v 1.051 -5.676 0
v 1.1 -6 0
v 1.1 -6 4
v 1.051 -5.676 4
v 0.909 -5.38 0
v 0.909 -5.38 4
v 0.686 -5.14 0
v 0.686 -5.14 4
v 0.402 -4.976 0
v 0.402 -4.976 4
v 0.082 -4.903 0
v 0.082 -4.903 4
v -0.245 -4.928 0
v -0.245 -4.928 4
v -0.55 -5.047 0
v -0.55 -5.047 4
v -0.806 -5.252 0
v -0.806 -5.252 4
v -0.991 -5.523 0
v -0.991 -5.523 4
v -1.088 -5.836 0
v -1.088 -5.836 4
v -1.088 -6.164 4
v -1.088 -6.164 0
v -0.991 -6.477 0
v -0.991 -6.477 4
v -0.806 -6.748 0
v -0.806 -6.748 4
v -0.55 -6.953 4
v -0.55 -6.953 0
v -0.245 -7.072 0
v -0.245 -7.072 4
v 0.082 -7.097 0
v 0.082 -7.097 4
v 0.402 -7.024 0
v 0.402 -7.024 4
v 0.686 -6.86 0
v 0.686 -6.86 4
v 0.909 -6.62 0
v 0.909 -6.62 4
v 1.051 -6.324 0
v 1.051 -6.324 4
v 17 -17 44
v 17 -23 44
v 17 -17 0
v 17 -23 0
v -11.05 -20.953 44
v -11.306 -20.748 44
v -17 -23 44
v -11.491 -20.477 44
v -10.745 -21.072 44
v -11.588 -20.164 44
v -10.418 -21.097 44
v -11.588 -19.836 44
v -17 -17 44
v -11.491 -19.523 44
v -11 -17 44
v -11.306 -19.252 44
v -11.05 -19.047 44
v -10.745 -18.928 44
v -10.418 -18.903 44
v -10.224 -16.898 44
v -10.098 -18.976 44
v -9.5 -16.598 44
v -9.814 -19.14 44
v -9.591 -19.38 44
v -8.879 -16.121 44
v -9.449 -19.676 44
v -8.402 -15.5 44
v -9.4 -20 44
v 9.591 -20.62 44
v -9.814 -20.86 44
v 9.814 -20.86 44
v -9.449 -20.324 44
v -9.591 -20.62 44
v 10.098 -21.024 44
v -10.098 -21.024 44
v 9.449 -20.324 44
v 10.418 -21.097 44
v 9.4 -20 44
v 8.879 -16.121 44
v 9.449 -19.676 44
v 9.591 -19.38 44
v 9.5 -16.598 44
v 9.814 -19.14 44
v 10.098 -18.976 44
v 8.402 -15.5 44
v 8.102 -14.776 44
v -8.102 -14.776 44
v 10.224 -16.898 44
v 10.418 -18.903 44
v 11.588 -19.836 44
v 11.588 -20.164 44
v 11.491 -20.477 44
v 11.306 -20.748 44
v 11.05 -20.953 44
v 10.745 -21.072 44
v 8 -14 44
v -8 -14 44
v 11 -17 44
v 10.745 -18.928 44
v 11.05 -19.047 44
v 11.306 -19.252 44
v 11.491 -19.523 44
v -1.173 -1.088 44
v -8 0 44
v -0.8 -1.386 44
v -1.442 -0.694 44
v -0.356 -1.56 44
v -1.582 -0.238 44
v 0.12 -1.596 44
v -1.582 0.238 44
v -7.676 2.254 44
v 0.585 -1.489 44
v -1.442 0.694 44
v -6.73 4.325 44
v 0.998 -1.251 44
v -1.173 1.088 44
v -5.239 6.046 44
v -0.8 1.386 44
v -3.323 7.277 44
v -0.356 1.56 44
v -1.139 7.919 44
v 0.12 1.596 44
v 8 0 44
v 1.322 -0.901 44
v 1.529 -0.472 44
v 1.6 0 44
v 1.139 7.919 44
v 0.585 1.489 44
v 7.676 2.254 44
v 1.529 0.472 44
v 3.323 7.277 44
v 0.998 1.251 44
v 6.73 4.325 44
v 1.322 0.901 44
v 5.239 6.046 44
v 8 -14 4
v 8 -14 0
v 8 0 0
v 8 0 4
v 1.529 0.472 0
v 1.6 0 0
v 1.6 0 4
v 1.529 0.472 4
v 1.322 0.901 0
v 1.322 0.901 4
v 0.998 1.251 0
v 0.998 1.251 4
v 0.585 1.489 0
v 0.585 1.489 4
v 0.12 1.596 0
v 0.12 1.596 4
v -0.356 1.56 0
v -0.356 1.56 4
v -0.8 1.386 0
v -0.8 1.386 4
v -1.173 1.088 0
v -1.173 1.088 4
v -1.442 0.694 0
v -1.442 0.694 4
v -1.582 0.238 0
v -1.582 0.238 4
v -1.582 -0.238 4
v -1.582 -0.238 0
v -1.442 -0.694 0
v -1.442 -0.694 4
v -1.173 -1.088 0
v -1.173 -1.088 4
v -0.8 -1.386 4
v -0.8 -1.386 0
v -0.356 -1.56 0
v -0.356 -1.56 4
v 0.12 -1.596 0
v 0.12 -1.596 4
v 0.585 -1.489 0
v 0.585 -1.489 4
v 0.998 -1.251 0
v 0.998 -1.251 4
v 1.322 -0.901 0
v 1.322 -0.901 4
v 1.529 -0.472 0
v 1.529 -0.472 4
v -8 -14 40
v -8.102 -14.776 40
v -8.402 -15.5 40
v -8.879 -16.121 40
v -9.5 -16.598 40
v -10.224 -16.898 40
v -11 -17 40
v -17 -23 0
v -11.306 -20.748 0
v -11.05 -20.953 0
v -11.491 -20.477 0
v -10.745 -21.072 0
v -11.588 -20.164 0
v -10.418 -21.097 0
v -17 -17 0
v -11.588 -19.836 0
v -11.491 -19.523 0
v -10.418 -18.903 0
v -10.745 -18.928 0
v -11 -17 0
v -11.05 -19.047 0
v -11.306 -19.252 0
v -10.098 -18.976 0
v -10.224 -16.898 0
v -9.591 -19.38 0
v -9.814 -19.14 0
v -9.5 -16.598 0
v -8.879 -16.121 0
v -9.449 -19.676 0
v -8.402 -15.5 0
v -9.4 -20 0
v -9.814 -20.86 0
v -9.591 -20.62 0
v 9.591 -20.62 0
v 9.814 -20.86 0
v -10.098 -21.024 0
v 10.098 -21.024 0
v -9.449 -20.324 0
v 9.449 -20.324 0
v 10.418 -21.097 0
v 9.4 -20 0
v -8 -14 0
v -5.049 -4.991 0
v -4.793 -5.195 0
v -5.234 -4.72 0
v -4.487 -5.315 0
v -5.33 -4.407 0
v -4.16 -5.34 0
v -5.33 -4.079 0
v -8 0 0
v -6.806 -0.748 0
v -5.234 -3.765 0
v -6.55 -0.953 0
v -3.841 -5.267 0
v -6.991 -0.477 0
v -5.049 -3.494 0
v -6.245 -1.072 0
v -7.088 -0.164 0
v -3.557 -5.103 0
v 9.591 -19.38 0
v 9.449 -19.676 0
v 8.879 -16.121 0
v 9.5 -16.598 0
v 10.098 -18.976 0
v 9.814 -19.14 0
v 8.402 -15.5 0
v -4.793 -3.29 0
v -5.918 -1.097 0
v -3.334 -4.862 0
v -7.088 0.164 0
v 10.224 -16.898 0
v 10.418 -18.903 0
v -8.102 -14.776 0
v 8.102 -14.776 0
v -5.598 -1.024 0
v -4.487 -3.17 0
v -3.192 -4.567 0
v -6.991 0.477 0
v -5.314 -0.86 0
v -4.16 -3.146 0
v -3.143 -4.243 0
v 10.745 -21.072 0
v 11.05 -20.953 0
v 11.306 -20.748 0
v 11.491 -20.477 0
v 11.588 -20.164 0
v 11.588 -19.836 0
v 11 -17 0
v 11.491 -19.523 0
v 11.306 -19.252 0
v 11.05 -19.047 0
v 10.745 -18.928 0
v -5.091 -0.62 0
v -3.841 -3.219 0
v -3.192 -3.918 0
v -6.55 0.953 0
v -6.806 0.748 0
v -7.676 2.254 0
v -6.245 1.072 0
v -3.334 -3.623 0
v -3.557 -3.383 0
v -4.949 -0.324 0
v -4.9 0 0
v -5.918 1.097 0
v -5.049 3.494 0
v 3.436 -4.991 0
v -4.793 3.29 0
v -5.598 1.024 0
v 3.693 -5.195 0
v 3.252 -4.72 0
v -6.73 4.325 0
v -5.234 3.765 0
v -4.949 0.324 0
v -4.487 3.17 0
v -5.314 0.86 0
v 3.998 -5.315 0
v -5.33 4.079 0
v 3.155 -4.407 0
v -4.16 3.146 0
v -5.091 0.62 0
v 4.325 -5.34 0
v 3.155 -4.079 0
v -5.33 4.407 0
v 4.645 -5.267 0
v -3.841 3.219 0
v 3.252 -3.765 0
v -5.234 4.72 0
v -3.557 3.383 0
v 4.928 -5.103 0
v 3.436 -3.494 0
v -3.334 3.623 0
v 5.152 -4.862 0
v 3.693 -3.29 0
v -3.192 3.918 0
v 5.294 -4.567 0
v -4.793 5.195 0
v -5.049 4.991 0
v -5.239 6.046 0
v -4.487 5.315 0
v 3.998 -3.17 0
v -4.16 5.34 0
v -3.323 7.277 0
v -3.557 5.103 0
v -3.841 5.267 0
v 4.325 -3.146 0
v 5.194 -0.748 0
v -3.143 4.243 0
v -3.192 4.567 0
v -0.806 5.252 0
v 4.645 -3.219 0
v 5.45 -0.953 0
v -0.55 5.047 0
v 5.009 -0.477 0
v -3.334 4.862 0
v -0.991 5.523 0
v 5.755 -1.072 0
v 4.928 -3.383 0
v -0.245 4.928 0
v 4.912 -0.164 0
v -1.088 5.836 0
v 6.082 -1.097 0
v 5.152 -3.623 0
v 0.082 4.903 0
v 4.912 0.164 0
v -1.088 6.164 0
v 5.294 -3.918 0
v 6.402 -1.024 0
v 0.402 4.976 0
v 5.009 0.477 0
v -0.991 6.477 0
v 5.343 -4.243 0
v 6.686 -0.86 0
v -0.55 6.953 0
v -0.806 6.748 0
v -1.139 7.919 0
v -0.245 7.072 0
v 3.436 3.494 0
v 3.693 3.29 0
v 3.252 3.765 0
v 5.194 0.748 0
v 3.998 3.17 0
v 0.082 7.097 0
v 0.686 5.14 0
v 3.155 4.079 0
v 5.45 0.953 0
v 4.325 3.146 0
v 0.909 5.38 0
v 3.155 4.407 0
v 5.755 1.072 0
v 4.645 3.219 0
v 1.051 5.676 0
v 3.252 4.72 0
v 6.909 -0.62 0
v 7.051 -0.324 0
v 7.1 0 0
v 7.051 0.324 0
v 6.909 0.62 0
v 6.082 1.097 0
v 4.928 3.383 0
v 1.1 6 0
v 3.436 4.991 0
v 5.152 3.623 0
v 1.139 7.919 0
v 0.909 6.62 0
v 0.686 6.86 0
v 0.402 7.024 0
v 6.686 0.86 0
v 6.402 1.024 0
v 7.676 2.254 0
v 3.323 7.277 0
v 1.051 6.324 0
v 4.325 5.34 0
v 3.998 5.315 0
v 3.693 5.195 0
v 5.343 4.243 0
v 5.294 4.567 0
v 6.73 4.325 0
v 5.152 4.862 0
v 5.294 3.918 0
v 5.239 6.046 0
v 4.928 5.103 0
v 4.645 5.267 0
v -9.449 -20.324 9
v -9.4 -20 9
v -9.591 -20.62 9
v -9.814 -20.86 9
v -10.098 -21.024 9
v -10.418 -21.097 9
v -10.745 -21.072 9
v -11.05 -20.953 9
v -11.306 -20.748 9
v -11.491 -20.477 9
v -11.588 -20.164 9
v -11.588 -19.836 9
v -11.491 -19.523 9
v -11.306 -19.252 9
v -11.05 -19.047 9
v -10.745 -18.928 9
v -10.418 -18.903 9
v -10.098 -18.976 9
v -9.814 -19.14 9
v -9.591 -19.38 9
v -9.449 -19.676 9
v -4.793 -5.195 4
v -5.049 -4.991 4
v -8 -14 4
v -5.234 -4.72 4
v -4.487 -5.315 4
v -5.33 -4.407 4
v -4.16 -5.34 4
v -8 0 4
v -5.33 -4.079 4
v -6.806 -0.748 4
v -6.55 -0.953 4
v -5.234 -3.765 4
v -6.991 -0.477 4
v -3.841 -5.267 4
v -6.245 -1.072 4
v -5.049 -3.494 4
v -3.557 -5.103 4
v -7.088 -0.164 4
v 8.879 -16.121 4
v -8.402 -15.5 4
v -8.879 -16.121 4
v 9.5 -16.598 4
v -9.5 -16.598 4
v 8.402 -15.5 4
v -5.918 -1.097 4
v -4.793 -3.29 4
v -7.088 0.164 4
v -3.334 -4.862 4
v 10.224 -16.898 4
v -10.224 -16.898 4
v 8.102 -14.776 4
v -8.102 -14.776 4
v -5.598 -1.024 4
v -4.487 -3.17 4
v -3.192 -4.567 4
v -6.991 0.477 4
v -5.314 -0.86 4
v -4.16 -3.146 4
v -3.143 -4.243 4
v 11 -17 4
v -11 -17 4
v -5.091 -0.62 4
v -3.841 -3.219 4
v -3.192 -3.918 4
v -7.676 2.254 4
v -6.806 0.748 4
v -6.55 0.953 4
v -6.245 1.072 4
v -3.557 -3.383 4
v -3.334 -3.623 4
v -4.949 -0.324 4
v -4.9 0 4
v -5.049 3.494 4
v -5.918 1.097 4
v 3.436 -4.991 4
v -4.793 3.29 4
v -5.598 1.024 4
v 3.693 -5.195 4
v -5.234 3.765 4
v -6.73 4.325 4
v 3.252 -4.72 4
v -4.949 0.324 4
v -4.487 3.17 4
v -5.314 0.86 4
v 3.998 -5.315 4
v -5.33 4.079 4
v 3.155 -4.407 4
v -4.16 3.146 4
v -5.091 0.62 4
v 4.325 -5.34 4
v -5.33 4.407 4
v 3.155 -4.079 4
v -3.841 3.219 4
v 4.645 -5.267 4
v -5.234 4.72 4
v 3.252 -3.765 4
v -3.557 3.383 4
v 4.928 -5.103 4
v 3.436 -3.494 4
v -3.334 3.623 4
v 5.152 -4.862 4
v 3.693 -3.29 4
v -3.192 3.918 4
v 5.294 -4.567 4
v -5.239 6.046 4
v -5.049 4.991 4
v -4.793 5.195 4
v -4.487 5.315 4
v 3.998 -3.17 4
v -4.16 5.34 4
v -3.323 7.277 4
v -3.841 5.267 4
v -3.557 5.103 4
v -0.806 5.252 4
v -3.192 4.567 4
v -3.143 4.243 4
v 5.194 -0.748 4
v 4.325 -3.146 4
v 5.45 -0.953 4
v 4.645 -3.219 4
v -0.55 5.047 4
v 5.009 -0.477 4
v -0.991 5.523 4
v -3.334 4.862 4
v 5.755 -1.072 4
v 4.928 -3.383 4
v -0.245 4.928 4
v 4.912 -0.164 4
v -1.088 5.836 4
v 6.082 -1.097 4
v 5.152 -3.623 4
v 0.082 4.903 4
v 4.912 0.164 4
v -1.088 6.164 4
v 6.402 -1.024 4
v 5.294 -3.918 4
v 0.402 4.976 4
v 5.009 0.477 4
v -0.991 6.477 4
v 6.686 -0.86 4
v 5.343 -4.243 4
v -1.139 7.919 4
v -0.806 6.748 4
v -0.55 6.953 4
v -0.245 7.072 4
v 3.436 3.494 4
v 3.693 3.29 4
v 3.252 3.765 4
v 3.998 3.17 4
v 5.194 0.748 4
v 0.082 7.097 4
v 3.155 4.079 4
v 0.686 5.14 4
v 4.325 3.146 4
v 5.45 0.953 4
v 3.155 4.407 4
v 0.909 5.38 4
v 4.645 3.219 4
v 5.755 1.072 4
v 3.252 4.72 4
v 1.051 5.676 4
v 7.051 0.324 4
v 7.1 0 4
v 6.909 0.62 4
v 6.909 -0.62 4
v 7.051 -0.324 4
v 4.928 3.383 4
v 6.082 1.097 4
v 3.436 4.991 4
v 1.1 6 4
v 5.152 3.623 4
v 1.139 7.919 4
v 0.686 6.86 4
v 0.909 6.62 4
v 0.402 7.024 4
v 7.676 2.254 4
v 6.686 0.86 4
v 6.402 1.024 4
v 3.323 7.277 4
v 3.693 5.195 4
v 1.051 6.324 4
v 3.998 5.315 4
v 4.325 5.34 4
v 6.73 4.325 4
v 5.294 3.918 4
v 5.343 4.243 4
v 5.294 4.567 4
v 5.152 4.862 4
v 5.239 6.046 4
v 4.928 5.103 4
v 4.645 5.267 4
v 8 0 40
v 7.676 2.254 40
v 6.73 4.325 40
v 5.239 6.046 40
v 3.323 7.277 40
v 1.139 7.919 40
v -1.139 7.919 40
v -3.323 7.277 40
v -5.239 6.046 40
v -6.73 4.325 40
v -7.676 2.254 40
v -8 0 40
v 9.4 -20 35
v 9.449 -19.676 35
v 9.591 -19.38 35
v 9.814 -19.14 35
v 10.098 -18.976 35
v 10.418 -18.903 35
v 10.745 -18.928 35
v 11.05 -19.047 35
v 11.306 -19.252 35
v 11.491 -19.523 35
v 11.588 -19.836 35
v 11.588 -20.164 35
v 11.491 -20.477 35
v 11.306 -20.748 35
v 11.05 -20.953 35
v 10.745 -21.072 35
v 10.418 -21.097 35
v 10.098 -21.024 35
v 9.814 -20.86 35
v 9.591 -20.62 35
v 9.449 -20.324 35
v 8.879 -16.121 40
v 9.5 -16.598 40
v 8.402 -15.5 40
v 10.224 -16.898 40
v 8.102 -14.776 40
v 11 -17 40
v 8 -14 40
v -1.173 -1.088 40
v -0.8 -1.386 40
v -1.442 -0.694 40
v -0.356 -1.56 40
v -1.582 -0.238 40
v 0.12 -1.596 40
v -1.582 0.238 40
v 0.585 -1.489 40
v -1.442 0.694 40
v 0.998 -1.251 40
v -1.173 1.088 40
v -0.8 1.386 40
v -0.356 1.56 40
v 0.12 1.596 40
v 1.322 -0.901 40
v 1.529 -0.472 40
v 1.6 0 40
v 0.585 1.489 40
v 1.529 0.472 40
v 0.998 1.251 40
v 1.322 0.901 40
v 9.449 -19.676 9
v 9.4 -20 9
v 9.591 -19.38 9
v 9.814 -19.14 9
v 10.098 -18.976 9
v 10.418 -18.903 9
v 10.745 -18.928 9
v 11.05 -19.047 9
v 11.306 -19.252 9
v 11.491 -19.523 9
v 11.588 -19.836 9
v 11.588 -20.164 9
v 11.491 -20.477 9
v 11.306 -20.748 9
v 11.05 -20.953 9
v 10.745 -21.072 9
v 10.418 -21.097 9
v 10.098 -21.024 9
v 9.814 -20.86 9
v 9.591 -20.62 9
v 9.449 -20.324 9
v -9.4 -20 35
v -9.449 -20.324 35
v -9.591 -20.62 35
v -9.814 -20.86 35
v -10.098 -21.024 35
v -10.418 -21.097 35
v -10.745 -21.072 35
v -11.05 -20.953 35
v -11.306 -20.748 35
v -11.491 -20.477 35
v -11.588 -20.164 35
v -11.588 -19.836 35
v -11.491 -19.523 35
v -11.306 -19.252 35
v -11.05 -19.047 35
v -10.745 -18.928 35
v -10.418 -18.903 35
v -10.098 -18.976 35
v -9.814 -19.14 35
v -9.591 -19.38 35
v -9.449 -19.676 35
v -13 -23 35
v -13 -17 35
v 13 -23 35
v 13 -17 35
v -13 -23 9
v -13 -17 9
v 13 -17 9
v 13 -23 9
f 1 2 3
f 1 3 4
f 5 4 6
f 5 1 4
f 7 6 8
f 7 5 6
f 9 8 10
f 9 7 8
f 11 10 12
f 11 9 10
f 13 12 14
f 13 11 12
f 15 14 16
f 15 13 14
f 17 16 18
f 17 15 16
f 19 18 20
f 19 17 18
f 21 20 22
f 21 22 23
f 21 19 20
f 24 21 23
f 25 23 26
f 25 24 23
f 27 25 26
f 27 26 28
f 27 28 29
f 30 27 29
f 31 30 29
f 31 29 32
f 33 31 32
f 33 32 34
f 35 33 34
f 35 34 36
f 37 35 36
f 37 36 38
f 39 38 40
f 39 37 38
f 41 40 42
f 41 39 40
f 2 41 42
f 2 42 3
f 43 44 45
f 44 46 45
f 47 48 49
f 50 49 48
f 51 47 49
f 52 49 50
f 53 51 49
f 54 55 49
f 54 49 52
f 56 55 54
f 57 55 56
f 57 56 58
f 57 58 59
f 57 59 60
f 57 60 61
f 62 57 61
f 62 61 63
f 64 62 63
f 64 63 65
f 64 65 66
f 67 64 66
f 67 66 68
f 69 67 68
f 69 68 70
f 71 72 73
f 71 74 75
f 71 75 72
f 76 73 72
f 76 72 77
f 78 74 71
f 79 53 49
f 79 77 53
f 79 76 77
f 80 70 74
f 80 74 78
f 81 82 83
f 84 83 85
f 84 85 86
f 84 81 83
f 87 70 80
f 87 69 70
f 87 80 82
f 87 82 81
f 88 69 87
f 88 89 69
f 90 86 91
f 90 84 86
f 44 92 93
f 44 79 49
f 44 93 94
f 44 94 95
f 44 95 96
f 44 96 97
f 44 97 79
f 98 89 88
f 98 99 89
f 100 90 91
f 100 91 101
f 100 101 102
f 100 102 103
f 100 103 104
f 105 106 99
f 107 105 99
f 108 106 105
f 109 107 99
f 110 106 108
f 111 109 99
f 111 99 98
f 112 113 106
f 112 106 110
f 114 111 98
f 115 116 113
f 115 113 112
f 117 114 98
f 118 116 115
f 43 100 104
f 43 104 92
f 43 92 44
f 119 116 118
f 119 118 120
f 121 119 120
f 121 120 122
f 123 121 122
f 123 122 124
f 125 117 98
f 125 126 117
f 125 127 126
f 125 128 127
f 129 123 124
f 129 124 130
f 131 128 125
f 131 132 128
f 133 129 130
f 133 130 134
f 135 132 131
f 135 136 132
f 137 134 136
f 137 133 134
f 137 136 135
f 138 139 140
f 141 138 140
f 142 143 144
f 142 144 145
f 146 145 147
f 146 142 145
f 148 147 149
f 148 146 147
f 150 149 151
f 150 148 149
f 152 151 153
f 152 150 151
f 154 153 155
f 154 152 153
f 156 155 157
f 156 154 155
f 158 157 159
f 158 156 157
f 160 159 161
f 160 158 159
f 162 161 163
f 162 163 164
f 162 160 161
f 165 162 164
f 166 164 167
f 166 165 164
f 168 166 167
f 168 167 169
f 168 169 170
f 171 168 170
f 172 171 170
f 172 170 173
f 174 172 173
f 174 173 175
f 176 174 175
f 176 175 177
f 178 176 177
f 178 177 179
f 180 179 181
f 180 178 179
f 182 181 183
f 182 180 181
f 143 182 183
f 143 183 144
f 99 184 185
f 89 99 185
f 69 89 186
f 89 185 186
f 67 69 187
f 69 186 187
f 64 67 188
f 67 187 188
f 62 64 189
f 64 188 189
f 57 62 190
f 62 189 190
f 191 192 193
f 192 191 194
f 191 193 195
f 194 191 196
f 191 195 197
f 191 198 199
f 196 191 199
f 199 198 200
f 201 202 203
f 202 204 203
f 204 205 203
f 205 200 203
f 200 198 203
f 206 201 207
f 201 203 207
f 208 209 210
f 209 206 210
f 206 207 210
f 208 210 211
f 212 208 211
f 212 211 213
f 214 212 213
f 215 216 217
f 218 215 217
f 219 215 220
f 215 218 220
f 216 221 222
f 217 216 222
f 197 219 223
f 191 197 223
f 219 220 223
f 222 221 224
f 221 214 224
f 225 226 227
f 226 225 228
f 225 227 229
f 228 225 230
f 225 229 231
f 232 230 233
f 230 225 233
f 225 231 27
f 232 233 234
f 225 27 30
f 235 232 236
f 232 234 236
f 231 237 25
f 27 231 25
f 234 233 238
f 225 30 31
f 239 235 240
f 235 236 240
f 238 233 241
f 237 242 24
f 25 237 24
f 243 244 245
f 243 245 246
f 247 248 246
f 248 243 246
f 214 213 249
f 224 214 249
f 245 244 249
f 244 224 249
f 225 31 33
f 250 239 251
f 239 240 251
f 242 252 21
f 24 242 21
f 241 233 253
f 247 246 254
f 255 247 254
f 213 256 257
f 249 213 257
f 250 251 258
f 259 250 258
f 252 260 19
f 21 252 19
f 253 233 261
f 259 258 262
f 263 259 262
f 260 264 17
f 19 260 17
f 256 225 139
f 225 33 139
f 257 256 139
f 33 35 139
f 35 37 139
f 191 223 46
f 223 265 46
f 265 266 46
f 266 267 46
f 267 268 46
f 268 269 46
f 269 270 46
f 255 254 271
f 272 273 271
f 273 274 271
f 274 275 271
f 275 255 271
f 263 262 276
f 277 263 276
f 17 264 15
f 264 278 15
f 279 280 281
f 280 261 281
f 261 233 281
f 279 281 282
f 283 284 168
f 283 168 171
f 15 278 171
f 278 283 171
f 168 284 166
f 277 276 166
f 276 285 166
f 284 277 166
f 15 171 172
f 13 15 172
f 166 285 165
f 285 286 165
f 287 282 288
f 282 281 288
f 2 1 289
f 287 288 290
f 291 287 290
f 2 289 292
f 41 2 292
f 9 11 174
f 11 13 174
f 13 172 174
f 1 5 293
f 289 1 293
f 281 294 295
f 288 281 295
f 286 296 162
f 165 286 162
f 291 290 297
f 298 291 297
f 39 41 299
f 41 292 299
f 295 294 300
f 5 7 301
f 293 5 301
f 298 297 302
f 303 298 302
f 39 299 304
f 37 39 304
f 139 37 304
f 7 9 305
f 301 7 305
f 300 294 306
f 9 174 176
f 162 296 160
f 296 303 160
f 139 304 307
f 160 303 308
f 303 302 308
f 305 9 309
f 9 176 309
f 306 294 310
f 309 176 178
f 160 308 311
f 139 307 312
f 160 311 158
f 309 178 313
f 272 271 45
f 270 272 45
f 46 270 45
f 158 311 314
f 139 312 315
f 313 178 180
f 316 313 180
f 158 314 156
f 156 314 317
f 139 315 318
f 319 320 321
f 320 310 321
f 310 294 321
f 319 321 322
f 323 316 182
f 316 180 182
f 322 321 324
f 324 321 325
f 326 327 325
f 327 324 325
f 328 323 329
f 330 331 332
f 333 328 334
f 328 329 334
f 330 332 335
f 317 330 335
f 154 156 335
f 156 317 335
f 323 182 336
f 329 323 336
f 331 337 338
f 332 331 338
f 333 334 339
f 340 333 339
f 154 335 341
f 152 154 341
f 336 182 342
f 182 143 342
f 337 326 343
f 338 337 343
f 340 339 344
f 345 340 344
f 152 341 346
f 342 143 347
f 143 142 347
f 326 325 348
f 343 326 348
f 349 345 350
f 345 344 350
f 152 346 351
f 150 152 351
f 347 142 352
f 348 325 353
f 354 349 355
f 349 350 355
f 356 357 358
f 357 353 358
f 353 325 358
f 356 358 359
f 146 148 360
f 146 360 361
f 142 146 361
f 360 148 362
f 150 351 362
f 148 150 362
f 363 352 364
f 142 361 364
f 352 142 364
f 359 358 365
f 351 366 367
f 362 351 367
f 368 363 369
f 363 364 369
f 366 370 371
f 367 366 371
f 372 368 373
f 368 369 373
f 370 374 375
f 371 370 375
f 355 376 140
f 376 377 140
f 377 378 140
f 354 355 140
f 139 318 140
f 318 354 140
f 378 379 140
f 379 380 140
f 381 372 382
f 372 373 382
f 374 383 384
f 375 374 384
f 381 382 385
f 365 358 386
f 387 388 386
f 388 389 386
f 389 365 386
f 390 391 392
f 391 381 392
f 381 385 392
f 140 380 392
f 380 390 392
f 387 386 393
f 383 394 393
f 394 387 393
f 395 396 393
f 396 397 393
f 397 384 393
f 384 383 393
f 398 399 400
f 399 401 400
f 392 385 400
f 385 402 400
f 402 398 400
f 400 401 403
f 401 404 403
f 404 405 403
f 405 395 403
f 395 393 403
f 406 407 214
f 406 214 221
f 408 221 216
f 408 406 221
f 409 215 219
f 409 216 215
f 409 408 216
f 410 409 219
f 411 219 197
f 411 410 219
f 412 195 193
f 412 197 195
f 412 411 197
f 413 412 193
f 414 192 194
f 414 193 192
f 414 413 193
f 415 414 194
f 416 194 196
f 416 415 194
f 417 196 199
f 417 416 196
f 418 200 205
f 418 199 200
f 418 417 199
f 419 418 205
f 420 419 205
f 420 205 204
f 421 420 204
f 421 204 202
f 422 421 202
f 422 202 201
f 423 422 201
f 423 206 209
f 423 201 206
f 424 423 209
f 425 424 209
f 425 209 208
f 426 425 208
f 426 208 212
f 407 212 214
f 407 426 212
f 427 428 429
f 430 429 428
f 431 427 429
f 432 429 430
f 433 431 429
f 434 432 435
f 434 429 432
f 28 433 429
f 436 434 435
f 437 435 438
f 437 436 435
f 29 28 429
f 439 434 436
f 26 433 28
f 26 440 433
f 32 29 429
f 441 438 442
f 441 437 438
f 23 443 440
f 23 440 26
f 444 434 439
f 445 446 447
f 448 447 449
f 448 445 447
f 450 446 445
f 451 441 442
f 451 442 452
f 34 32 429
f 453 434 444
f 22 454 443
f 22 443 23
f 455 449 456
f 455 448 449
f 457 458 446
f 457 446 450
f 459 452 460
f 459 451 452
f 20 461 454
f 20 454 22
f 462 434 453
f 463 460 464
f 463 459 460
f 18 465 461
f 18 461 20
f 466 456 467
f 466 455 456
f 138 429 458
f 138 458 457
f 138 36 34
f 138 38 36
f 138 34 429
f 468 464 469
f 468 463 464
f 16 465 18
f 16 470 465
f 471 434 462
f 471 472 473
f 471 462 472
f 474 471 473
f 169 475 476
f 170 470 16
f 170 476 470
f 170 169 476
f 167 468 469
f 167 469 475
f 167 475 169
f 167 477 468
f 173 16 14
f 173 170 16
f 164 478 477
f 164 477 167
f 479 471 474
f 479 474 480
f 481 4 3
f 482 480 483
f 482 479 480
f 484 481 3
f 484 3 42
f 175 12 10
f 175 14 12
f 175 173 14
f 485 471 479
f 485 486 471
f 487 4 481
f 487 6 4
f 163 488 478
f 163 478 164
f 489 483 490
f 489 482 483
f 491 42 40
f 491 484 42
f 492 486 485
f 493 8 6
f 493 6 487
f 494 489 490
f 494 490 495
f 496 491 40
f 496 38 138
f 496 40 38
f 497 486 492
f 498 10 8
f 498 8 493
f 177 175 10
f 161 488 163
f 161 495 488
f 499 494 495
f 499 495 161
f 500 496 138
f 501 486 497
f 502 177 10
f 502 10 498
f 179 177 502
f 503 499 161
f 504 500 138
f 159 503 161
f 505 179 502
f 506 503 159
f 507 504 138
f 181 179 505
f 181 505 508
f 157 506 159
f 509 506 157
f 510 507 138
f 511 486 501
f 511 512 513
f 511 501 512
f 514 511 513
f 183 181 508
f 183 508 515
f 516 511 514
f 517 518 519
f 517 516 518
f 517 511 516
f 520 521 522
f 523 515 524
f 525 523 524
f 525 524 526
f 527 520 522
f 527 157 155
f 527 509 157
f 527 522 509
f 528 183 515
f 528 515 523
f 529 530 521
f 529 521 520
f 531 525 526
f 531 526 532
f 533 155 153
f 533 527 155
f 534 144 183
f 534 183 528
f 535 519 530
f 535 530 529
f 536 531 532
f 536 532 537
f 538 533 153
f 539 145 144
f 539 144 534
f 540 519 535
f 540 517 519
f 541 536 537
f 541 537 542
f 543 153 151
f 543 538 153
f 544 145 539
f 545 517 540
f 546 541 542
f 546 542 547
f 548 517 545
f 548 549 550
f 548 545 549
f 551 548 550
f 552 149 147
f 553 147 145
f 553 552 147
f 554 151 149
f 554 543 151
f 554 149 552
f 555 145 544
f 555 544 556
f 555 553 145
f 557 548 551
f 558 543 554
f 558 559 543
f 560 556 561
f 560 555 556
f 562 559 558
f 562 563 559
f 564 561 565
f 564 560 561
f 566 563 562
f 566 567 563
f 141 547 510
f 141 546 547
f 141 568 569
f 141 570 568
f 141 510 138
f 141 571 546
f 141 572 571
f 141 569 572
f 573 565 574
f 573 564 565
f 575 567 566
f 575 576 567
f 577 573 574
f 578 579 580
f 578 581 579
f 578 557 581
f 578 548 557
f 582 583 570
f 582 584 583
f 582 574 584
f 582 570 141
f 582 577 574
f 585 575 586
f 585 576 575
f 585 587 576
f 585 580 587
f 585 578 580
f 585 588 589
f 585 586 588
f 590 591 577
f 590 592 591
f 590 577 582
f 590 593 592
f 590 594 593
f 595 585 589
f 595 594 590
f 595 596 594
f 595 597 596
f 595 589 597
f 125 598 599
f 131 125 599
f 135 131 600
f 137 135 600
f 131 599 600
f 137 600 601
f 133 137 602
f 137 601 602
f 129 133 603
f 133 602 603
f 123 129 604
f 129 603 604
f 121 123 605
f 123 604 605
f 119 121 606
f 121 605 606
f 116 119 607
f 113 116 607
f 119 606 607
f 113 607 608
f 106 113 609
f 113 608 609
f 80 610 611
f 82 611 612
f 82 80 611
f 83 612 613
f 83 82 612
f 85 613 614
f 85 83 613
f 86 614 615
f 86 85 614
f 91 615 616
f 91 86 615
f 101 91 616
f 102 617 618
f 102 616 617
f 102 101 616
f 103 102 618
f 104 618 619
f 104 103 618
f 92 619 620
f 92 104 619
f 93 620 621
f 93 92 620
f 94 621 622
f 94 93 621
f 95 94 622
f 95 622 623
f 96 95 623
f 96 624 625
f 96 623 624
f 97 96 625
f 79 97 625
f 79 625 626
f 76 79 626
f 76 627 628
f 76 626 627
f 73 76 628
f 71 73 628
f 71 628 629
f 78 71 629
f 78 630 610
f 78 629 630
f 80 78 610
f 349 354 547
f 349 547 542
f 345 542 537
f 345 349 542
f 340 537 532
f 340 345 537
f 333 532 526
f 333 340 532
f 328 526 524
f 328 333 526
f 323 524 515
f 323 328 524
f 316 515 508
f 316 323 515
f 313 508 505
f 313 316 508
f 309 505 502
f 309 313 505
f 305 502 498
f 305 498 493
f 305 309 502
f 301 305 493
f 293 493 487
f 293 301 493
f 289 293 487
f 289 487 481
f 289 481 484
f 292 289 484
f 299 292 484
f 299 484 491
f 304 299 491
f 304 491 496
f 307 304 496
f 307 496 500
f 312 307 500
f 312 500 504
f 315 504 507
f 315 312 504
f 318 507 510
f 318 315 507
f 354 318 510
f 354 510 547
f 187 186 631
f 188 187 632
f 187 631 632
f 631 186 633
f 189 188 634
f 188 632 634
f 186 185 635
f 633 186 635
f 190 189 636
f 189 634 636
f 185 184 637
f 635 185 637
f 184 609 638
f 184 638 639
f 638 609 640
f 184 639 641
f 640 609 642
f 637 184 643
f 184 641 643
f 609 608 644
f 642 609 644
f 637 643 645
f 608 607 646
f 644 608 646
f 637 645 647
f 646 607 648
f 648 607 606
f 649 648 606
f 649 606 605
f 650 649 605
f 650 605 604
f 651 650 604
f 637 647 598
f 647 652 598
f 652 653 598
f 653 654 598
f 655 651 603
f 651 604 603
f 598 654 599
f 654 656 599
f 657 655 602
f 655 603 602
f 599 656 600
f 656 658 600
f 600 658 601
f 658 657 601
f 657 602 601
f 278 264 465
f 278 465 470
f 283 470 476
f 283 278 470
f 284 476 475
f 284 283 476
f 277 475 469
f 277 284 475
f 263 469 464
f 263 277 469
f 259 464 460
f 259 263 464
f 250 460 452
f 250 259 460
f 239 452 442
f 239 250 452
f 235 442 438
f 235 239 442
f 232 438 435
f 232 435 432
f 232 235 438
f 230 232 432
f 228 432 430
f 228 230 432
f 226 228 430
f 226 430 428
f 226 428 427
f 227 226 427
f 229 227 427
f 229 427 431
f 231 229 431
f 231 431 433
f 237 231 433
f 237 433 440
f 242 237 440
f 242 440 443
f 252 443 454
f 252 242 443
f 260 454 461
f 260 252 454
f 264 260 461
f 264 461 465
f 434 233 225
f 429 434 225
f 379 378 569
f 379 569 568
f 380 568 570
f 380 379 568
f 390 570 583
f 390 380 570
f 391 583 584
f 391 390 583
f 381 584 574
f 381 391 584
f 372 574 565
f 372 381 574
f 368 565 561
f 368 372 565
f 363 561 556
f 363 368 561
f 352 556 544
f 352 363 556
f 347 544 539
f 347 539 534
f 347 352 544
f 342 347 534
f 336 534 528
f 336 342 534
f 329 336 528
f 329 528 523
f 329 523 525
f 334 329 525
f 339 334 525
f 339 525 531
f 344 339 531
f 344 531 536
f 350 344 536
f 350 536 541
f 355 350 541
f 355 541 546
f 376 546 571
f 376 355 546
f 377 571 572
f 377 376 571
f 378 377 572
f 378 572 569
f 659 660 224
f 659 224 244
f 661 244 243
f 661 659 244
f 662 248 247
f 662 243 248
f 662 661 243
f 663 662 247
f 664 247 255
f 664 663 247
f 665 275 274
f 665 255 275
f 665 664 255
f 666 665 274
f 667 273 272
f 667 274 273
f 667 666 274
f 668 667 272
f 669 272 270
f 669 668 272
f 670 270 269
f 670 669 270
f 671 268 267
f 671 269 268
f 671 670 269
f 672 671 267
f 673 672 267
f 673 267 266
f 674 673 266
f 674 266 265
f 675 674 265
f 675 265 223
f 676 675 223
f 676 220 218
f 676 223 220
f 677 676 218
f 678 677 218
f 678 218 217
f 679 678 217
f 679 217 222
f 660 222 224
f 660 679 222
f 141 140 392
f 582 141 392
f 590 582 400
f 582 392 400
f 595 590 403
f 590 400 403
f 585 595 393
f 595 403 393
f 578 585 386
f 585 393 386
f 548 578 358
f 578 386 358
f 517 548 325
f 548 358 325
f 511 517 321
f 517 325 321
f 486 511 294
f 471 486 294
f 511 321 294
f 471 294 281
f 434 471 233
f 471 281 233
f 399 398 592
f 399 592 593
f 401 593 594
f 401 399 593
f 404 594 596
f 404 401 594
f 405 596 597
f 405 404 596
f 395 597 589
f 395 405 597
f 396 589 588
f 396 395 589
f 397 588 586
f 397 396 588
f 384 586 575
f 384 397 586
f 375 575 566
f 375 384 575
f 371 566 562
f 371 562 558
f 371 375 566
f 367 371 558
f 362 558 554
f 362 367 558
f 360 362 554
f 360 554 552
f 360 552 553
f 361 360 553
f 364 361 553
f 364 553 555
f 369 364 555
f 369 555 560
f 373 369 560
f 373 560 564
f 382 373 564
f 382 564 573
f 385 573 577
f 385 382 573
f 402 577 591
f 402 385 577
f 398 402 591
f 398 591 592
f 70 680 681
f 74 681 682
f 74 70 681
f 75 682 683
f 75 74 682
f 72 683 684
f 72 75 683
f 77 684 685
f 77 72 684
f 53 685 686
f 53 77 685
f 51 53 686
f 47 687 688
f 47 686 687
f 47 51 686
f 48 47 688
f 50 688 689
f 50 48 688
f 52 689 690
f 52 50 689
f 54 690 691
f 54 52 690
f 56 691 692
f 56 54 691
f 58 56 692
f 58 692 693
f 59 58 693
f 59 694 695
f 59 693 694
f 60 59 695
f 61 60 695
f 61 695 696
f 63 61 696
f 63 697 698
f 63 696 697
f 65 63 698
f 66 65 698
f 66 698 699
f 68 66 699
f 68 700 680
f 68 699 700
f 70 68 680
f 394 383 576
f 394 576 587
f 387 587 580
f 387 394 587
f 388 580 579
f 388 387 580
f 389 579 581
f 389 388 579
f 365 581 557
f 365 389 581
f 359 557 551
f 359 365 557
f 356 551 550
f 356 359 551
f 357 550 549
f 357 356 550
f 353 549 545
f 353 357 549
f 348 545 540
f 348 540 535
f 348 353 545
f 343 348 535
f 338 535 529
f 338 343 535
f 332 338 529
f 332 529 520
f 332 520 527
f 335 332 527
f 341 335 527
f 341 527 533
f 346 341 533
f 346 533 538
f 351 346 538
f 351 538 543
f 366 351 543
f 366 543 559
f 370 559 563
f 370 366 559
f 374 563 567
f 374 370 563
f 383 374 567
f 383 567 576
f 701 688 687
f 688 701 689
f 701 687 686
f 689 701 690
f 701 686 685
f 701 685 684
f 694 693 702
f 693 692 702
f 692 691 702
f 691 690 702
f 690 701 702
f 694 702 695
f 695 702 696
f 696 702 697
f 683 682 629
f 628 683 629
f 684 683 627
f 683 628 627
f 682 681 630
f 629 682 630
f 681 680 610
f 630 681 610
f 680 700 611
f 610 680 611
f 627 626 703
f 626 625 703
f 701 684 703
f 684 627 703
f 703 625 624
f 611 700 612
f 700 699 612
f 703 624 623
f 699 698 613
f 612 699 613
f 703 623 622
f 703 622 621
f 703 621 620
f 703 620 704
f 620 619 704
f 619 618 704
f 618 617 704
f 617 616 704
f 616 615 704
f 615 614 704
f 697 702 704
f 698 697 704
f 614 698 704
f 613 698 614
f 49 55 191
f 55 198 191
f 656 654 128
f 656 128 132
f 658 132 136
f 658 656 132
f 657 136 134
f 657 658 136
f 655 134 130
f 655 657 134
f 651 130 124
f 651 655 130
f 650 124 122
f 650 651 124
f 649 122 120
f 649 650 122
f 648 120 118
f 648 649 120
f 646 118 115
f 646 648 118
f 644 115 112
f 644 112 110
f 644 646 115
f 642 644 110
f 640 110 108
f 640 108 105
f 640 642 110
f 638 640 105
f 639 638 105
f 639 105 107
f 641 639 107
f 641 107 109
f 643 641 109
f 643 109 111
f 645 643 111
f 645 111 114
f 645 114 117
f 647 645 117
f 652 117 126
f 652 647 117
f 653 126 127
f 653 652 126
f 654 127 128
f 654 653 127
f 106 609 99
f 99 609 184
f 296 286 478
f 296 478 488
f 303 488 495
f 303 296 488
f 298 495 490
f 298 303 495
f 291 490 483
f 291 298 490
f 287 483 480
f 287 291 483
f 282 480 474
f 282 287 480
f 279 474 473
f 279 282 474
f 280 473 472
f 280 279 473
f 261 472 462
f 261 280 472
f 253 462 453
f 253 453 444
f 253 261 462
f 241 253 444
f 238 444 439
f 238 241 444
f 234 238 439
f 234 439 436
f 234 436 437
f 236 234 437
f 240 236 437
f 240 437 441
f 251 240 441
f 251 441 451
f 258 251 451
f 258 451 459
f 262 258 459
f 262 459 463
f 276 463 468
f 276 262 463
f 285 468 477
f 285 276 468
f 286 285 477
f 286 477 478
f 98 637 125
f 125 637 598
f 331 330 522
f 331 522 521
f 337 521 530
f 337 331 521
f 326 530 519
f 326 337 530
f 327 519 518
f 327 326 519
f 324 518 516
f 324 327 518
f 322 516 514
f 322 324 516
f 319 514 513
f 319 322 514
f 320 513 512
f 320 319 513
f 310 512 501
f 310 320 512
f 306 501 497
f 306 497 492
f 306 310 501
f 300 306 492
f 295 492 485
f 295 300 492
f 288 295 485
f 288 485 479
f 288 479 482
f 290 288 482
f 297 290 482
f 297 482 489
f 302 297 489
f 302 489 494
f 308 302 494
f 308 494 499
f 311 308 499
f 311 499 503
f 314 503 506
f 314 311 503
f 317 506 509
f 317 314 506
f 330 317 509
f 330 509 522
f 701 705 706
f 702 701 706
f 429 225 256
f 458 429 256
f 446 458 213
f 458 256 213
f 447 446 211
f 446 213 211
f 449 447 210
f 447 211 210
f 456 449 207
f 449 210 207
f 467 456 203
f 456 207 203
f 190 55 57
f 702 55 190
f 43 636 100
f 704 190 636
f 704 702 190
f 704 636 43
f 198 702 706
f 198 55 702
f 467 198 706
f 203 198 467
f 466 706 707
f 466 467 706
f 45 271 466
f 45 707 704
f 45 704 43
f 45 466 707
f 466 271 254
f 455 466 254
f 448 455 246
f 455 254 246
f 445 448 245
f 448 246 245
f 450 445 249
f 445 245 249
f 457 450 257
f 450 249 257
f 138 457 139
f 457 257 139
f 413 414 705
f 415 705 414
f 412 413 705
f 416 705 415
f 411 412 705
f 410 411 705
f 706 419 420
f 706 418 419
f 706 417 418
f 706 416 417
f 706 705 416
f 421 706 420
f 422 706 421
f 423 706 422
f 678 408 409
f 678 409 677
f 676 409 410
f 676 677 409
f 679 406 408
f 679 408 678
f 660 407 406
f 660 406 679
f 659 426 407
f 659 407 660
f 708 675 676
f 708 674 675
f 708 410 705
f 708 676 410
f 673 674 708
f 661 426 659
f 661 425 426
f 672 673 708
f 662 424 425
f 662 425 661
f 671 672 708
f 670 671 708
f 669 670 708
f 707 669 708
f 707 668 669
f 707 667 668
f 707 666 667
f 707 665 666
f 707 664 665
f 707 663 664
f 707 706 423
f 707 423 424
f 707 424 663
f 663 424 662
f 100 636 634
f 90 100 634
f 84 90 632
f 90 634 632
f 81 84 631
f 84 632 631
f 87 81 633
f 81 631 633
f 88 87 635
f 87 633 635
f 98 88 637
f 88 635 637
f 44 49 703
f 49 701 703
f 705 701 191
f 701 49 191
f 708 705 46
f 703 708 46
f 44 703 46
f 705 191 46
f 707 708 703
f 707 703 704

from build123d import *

# Parameters (mm, degrees)
SKETCH_1_R          = 1.1
SKETCH_1_R_2        = 1.6
EXTRUDE_1_DEPTH     = 4
SKETCH_2_W          = 4
SKETCH_2_H          = 6
EXTRUDE_2_DEPTH     = 36
SKETCH_3_R          = 1.6
EXTRUDE_3_DEPTH     = 4
SKETCH_4_W          = 26
SKETCH_4_H          = 5
EXTRUDE_4_DEPTH     = 6
SKETCH_7_R          = 1.1
CUT_EXTRUDE_2_DEPTH = 66.61562314


with BuildPart() as part:
    # ｽｹｯﾁ1 → ﾎﾞｽ - 押し出し1 (new body)
    with BuildSketch(Plane.XY):
        with BuildLine():
            Line((-17, -17), (-17, -23))
            Line((-17, -23), (17, -23))
            Line((17, -23), (17, -17))
            Line((17, -17), (11, -17))
            ThreePointArc((11, -17), (8.878679656, -16.121320344), (8, -14))
            Line((8, -14), (8, 0))
            ThreePointArc((8, 0), (0, 8), (-8, 0))
            Line((-8, 0), (-8, -14))
            ThreePointArc((-8, -14), (-8.878679656, -16.121320344), (-11, -17))
            Line((-11, -17), (-17, -17))
        make_face()
        with Locations((0, 6)):
            Circle(SKETCH_1_R, mode=Mode.SUBTRACT)
        with Locations((4.242640687, 4.242640687)):
            Circle(SKETCH_1_R, mode=Mode.SUBTRACT)
        with Locations((6, 0)):
            Circle(SKETCH_1_R, mode=Mode.SUBTRACT)
        with Locations((4.242640687, -4.242640687)):
            Circle(SKETCH_1_R, mode=Mode.SUBTRACT)
        with Locations((0, -6)):
            Circle(SKETCH_1_R, mode=Mode.SUBTRACT)
        with Locations((-4.242640687, -4.242640687)):
            Circle(SKETCH_1_R, mode=Mode.SUBTRACT)
        with Locations((-6, 0)):
            Circle(SKETCH_1_R, mode=Mode.SUBTRACT)
        with Locations((-4.242640687, 4.242640687)):
            Circle(SKETCH_1_R, mode=Mode.SUBTRACT)
        Circle(SKETCH_1_R_2, mode=Mode.SUBTRACT)
    extrude(amount=EXTRUDE_1_DEPTH)

    # ｽｹｯﾁ2 → ﾎﾞｽ - 押し出し2 (add)
    with BuildSketch(Plane.XY.offset(4)):
        with Locations((-15, -20)):
            Rectangle(SKETCH_2_W, SKETCH_2_H)
        with Locations((15, -20)):
            Rectangle(SKETCH_2_W, SKETCH_2_H)
    extrude(amount=EXTRUDE_2_DEPTH)

    # ｽｹｯﾁ3 → ﾎﾞｽ - 押し出し3 (add)
    with BuildSketch(Plane.XY.offset(40)):
        with BuildLine():
            Line((-11, -17), (-17, -17))
            Line((-17, -17), (-17, -23))
            Line((-17, -23), (17, -23))
            Line((17, -23), (17, -17))
            Line((17, -17), (11, -17))
            ThreePointArc((11, -17), (8.878679656, -16.121320344), (8, -14))
            Line((8, -14), (8, 0))
            ThreePointArc((8, 0), (0, 8), (-8, 0))
            Line((-8, 0), (-8, -14))
            ThreePointArc((-8, -14), (-8.878679656, -16.121320344), (-11, -17))
        make_face()
        Circle(SKETCH_3_R, mode=Mode.SUBTRACT)
    extrude(amount=EXTRUDE_3_DEPTH)

    # ｽｹｯﾁ4 → ﾎﾞｽ - 押し出し4 (add)
    with BuildSketch(Plane(origin=(0, -17, 0), x_dir=(1, 0, 0), z_dir=(0, 1, 0))):
        with Locations((0, -6.5)):
            Rectangle(SKETCH_4_W, SKETCH_4_H)
        with Locations((0, -37.5)):
            Rectangle(SKETCH_4_W, SKETCH_4_H)
    extrude(amount=-EXTRUDE_4_DEPTH)

    # ｽｹｯﾁ7 → ｶｯﾄ - 押し出し2 (cut, through all)
    with BuildSketch(Plane(origin=(-25.9, 0, 44), x_dir=(-1, 0, 0), z_dir=(0, 0, -1))):
        with Locations((-36.4, -20)):
            Circle(SKETCH_7_R)
        with Locations(Location((-15.4, -20, 0), (0, 0, 180))):
            Circle(SKETCH_7_R)
    extrude(amount=CUT_EXTRUDE_2_DEPTH, mode=Mode.SUBTRACT)


solid = part.part
